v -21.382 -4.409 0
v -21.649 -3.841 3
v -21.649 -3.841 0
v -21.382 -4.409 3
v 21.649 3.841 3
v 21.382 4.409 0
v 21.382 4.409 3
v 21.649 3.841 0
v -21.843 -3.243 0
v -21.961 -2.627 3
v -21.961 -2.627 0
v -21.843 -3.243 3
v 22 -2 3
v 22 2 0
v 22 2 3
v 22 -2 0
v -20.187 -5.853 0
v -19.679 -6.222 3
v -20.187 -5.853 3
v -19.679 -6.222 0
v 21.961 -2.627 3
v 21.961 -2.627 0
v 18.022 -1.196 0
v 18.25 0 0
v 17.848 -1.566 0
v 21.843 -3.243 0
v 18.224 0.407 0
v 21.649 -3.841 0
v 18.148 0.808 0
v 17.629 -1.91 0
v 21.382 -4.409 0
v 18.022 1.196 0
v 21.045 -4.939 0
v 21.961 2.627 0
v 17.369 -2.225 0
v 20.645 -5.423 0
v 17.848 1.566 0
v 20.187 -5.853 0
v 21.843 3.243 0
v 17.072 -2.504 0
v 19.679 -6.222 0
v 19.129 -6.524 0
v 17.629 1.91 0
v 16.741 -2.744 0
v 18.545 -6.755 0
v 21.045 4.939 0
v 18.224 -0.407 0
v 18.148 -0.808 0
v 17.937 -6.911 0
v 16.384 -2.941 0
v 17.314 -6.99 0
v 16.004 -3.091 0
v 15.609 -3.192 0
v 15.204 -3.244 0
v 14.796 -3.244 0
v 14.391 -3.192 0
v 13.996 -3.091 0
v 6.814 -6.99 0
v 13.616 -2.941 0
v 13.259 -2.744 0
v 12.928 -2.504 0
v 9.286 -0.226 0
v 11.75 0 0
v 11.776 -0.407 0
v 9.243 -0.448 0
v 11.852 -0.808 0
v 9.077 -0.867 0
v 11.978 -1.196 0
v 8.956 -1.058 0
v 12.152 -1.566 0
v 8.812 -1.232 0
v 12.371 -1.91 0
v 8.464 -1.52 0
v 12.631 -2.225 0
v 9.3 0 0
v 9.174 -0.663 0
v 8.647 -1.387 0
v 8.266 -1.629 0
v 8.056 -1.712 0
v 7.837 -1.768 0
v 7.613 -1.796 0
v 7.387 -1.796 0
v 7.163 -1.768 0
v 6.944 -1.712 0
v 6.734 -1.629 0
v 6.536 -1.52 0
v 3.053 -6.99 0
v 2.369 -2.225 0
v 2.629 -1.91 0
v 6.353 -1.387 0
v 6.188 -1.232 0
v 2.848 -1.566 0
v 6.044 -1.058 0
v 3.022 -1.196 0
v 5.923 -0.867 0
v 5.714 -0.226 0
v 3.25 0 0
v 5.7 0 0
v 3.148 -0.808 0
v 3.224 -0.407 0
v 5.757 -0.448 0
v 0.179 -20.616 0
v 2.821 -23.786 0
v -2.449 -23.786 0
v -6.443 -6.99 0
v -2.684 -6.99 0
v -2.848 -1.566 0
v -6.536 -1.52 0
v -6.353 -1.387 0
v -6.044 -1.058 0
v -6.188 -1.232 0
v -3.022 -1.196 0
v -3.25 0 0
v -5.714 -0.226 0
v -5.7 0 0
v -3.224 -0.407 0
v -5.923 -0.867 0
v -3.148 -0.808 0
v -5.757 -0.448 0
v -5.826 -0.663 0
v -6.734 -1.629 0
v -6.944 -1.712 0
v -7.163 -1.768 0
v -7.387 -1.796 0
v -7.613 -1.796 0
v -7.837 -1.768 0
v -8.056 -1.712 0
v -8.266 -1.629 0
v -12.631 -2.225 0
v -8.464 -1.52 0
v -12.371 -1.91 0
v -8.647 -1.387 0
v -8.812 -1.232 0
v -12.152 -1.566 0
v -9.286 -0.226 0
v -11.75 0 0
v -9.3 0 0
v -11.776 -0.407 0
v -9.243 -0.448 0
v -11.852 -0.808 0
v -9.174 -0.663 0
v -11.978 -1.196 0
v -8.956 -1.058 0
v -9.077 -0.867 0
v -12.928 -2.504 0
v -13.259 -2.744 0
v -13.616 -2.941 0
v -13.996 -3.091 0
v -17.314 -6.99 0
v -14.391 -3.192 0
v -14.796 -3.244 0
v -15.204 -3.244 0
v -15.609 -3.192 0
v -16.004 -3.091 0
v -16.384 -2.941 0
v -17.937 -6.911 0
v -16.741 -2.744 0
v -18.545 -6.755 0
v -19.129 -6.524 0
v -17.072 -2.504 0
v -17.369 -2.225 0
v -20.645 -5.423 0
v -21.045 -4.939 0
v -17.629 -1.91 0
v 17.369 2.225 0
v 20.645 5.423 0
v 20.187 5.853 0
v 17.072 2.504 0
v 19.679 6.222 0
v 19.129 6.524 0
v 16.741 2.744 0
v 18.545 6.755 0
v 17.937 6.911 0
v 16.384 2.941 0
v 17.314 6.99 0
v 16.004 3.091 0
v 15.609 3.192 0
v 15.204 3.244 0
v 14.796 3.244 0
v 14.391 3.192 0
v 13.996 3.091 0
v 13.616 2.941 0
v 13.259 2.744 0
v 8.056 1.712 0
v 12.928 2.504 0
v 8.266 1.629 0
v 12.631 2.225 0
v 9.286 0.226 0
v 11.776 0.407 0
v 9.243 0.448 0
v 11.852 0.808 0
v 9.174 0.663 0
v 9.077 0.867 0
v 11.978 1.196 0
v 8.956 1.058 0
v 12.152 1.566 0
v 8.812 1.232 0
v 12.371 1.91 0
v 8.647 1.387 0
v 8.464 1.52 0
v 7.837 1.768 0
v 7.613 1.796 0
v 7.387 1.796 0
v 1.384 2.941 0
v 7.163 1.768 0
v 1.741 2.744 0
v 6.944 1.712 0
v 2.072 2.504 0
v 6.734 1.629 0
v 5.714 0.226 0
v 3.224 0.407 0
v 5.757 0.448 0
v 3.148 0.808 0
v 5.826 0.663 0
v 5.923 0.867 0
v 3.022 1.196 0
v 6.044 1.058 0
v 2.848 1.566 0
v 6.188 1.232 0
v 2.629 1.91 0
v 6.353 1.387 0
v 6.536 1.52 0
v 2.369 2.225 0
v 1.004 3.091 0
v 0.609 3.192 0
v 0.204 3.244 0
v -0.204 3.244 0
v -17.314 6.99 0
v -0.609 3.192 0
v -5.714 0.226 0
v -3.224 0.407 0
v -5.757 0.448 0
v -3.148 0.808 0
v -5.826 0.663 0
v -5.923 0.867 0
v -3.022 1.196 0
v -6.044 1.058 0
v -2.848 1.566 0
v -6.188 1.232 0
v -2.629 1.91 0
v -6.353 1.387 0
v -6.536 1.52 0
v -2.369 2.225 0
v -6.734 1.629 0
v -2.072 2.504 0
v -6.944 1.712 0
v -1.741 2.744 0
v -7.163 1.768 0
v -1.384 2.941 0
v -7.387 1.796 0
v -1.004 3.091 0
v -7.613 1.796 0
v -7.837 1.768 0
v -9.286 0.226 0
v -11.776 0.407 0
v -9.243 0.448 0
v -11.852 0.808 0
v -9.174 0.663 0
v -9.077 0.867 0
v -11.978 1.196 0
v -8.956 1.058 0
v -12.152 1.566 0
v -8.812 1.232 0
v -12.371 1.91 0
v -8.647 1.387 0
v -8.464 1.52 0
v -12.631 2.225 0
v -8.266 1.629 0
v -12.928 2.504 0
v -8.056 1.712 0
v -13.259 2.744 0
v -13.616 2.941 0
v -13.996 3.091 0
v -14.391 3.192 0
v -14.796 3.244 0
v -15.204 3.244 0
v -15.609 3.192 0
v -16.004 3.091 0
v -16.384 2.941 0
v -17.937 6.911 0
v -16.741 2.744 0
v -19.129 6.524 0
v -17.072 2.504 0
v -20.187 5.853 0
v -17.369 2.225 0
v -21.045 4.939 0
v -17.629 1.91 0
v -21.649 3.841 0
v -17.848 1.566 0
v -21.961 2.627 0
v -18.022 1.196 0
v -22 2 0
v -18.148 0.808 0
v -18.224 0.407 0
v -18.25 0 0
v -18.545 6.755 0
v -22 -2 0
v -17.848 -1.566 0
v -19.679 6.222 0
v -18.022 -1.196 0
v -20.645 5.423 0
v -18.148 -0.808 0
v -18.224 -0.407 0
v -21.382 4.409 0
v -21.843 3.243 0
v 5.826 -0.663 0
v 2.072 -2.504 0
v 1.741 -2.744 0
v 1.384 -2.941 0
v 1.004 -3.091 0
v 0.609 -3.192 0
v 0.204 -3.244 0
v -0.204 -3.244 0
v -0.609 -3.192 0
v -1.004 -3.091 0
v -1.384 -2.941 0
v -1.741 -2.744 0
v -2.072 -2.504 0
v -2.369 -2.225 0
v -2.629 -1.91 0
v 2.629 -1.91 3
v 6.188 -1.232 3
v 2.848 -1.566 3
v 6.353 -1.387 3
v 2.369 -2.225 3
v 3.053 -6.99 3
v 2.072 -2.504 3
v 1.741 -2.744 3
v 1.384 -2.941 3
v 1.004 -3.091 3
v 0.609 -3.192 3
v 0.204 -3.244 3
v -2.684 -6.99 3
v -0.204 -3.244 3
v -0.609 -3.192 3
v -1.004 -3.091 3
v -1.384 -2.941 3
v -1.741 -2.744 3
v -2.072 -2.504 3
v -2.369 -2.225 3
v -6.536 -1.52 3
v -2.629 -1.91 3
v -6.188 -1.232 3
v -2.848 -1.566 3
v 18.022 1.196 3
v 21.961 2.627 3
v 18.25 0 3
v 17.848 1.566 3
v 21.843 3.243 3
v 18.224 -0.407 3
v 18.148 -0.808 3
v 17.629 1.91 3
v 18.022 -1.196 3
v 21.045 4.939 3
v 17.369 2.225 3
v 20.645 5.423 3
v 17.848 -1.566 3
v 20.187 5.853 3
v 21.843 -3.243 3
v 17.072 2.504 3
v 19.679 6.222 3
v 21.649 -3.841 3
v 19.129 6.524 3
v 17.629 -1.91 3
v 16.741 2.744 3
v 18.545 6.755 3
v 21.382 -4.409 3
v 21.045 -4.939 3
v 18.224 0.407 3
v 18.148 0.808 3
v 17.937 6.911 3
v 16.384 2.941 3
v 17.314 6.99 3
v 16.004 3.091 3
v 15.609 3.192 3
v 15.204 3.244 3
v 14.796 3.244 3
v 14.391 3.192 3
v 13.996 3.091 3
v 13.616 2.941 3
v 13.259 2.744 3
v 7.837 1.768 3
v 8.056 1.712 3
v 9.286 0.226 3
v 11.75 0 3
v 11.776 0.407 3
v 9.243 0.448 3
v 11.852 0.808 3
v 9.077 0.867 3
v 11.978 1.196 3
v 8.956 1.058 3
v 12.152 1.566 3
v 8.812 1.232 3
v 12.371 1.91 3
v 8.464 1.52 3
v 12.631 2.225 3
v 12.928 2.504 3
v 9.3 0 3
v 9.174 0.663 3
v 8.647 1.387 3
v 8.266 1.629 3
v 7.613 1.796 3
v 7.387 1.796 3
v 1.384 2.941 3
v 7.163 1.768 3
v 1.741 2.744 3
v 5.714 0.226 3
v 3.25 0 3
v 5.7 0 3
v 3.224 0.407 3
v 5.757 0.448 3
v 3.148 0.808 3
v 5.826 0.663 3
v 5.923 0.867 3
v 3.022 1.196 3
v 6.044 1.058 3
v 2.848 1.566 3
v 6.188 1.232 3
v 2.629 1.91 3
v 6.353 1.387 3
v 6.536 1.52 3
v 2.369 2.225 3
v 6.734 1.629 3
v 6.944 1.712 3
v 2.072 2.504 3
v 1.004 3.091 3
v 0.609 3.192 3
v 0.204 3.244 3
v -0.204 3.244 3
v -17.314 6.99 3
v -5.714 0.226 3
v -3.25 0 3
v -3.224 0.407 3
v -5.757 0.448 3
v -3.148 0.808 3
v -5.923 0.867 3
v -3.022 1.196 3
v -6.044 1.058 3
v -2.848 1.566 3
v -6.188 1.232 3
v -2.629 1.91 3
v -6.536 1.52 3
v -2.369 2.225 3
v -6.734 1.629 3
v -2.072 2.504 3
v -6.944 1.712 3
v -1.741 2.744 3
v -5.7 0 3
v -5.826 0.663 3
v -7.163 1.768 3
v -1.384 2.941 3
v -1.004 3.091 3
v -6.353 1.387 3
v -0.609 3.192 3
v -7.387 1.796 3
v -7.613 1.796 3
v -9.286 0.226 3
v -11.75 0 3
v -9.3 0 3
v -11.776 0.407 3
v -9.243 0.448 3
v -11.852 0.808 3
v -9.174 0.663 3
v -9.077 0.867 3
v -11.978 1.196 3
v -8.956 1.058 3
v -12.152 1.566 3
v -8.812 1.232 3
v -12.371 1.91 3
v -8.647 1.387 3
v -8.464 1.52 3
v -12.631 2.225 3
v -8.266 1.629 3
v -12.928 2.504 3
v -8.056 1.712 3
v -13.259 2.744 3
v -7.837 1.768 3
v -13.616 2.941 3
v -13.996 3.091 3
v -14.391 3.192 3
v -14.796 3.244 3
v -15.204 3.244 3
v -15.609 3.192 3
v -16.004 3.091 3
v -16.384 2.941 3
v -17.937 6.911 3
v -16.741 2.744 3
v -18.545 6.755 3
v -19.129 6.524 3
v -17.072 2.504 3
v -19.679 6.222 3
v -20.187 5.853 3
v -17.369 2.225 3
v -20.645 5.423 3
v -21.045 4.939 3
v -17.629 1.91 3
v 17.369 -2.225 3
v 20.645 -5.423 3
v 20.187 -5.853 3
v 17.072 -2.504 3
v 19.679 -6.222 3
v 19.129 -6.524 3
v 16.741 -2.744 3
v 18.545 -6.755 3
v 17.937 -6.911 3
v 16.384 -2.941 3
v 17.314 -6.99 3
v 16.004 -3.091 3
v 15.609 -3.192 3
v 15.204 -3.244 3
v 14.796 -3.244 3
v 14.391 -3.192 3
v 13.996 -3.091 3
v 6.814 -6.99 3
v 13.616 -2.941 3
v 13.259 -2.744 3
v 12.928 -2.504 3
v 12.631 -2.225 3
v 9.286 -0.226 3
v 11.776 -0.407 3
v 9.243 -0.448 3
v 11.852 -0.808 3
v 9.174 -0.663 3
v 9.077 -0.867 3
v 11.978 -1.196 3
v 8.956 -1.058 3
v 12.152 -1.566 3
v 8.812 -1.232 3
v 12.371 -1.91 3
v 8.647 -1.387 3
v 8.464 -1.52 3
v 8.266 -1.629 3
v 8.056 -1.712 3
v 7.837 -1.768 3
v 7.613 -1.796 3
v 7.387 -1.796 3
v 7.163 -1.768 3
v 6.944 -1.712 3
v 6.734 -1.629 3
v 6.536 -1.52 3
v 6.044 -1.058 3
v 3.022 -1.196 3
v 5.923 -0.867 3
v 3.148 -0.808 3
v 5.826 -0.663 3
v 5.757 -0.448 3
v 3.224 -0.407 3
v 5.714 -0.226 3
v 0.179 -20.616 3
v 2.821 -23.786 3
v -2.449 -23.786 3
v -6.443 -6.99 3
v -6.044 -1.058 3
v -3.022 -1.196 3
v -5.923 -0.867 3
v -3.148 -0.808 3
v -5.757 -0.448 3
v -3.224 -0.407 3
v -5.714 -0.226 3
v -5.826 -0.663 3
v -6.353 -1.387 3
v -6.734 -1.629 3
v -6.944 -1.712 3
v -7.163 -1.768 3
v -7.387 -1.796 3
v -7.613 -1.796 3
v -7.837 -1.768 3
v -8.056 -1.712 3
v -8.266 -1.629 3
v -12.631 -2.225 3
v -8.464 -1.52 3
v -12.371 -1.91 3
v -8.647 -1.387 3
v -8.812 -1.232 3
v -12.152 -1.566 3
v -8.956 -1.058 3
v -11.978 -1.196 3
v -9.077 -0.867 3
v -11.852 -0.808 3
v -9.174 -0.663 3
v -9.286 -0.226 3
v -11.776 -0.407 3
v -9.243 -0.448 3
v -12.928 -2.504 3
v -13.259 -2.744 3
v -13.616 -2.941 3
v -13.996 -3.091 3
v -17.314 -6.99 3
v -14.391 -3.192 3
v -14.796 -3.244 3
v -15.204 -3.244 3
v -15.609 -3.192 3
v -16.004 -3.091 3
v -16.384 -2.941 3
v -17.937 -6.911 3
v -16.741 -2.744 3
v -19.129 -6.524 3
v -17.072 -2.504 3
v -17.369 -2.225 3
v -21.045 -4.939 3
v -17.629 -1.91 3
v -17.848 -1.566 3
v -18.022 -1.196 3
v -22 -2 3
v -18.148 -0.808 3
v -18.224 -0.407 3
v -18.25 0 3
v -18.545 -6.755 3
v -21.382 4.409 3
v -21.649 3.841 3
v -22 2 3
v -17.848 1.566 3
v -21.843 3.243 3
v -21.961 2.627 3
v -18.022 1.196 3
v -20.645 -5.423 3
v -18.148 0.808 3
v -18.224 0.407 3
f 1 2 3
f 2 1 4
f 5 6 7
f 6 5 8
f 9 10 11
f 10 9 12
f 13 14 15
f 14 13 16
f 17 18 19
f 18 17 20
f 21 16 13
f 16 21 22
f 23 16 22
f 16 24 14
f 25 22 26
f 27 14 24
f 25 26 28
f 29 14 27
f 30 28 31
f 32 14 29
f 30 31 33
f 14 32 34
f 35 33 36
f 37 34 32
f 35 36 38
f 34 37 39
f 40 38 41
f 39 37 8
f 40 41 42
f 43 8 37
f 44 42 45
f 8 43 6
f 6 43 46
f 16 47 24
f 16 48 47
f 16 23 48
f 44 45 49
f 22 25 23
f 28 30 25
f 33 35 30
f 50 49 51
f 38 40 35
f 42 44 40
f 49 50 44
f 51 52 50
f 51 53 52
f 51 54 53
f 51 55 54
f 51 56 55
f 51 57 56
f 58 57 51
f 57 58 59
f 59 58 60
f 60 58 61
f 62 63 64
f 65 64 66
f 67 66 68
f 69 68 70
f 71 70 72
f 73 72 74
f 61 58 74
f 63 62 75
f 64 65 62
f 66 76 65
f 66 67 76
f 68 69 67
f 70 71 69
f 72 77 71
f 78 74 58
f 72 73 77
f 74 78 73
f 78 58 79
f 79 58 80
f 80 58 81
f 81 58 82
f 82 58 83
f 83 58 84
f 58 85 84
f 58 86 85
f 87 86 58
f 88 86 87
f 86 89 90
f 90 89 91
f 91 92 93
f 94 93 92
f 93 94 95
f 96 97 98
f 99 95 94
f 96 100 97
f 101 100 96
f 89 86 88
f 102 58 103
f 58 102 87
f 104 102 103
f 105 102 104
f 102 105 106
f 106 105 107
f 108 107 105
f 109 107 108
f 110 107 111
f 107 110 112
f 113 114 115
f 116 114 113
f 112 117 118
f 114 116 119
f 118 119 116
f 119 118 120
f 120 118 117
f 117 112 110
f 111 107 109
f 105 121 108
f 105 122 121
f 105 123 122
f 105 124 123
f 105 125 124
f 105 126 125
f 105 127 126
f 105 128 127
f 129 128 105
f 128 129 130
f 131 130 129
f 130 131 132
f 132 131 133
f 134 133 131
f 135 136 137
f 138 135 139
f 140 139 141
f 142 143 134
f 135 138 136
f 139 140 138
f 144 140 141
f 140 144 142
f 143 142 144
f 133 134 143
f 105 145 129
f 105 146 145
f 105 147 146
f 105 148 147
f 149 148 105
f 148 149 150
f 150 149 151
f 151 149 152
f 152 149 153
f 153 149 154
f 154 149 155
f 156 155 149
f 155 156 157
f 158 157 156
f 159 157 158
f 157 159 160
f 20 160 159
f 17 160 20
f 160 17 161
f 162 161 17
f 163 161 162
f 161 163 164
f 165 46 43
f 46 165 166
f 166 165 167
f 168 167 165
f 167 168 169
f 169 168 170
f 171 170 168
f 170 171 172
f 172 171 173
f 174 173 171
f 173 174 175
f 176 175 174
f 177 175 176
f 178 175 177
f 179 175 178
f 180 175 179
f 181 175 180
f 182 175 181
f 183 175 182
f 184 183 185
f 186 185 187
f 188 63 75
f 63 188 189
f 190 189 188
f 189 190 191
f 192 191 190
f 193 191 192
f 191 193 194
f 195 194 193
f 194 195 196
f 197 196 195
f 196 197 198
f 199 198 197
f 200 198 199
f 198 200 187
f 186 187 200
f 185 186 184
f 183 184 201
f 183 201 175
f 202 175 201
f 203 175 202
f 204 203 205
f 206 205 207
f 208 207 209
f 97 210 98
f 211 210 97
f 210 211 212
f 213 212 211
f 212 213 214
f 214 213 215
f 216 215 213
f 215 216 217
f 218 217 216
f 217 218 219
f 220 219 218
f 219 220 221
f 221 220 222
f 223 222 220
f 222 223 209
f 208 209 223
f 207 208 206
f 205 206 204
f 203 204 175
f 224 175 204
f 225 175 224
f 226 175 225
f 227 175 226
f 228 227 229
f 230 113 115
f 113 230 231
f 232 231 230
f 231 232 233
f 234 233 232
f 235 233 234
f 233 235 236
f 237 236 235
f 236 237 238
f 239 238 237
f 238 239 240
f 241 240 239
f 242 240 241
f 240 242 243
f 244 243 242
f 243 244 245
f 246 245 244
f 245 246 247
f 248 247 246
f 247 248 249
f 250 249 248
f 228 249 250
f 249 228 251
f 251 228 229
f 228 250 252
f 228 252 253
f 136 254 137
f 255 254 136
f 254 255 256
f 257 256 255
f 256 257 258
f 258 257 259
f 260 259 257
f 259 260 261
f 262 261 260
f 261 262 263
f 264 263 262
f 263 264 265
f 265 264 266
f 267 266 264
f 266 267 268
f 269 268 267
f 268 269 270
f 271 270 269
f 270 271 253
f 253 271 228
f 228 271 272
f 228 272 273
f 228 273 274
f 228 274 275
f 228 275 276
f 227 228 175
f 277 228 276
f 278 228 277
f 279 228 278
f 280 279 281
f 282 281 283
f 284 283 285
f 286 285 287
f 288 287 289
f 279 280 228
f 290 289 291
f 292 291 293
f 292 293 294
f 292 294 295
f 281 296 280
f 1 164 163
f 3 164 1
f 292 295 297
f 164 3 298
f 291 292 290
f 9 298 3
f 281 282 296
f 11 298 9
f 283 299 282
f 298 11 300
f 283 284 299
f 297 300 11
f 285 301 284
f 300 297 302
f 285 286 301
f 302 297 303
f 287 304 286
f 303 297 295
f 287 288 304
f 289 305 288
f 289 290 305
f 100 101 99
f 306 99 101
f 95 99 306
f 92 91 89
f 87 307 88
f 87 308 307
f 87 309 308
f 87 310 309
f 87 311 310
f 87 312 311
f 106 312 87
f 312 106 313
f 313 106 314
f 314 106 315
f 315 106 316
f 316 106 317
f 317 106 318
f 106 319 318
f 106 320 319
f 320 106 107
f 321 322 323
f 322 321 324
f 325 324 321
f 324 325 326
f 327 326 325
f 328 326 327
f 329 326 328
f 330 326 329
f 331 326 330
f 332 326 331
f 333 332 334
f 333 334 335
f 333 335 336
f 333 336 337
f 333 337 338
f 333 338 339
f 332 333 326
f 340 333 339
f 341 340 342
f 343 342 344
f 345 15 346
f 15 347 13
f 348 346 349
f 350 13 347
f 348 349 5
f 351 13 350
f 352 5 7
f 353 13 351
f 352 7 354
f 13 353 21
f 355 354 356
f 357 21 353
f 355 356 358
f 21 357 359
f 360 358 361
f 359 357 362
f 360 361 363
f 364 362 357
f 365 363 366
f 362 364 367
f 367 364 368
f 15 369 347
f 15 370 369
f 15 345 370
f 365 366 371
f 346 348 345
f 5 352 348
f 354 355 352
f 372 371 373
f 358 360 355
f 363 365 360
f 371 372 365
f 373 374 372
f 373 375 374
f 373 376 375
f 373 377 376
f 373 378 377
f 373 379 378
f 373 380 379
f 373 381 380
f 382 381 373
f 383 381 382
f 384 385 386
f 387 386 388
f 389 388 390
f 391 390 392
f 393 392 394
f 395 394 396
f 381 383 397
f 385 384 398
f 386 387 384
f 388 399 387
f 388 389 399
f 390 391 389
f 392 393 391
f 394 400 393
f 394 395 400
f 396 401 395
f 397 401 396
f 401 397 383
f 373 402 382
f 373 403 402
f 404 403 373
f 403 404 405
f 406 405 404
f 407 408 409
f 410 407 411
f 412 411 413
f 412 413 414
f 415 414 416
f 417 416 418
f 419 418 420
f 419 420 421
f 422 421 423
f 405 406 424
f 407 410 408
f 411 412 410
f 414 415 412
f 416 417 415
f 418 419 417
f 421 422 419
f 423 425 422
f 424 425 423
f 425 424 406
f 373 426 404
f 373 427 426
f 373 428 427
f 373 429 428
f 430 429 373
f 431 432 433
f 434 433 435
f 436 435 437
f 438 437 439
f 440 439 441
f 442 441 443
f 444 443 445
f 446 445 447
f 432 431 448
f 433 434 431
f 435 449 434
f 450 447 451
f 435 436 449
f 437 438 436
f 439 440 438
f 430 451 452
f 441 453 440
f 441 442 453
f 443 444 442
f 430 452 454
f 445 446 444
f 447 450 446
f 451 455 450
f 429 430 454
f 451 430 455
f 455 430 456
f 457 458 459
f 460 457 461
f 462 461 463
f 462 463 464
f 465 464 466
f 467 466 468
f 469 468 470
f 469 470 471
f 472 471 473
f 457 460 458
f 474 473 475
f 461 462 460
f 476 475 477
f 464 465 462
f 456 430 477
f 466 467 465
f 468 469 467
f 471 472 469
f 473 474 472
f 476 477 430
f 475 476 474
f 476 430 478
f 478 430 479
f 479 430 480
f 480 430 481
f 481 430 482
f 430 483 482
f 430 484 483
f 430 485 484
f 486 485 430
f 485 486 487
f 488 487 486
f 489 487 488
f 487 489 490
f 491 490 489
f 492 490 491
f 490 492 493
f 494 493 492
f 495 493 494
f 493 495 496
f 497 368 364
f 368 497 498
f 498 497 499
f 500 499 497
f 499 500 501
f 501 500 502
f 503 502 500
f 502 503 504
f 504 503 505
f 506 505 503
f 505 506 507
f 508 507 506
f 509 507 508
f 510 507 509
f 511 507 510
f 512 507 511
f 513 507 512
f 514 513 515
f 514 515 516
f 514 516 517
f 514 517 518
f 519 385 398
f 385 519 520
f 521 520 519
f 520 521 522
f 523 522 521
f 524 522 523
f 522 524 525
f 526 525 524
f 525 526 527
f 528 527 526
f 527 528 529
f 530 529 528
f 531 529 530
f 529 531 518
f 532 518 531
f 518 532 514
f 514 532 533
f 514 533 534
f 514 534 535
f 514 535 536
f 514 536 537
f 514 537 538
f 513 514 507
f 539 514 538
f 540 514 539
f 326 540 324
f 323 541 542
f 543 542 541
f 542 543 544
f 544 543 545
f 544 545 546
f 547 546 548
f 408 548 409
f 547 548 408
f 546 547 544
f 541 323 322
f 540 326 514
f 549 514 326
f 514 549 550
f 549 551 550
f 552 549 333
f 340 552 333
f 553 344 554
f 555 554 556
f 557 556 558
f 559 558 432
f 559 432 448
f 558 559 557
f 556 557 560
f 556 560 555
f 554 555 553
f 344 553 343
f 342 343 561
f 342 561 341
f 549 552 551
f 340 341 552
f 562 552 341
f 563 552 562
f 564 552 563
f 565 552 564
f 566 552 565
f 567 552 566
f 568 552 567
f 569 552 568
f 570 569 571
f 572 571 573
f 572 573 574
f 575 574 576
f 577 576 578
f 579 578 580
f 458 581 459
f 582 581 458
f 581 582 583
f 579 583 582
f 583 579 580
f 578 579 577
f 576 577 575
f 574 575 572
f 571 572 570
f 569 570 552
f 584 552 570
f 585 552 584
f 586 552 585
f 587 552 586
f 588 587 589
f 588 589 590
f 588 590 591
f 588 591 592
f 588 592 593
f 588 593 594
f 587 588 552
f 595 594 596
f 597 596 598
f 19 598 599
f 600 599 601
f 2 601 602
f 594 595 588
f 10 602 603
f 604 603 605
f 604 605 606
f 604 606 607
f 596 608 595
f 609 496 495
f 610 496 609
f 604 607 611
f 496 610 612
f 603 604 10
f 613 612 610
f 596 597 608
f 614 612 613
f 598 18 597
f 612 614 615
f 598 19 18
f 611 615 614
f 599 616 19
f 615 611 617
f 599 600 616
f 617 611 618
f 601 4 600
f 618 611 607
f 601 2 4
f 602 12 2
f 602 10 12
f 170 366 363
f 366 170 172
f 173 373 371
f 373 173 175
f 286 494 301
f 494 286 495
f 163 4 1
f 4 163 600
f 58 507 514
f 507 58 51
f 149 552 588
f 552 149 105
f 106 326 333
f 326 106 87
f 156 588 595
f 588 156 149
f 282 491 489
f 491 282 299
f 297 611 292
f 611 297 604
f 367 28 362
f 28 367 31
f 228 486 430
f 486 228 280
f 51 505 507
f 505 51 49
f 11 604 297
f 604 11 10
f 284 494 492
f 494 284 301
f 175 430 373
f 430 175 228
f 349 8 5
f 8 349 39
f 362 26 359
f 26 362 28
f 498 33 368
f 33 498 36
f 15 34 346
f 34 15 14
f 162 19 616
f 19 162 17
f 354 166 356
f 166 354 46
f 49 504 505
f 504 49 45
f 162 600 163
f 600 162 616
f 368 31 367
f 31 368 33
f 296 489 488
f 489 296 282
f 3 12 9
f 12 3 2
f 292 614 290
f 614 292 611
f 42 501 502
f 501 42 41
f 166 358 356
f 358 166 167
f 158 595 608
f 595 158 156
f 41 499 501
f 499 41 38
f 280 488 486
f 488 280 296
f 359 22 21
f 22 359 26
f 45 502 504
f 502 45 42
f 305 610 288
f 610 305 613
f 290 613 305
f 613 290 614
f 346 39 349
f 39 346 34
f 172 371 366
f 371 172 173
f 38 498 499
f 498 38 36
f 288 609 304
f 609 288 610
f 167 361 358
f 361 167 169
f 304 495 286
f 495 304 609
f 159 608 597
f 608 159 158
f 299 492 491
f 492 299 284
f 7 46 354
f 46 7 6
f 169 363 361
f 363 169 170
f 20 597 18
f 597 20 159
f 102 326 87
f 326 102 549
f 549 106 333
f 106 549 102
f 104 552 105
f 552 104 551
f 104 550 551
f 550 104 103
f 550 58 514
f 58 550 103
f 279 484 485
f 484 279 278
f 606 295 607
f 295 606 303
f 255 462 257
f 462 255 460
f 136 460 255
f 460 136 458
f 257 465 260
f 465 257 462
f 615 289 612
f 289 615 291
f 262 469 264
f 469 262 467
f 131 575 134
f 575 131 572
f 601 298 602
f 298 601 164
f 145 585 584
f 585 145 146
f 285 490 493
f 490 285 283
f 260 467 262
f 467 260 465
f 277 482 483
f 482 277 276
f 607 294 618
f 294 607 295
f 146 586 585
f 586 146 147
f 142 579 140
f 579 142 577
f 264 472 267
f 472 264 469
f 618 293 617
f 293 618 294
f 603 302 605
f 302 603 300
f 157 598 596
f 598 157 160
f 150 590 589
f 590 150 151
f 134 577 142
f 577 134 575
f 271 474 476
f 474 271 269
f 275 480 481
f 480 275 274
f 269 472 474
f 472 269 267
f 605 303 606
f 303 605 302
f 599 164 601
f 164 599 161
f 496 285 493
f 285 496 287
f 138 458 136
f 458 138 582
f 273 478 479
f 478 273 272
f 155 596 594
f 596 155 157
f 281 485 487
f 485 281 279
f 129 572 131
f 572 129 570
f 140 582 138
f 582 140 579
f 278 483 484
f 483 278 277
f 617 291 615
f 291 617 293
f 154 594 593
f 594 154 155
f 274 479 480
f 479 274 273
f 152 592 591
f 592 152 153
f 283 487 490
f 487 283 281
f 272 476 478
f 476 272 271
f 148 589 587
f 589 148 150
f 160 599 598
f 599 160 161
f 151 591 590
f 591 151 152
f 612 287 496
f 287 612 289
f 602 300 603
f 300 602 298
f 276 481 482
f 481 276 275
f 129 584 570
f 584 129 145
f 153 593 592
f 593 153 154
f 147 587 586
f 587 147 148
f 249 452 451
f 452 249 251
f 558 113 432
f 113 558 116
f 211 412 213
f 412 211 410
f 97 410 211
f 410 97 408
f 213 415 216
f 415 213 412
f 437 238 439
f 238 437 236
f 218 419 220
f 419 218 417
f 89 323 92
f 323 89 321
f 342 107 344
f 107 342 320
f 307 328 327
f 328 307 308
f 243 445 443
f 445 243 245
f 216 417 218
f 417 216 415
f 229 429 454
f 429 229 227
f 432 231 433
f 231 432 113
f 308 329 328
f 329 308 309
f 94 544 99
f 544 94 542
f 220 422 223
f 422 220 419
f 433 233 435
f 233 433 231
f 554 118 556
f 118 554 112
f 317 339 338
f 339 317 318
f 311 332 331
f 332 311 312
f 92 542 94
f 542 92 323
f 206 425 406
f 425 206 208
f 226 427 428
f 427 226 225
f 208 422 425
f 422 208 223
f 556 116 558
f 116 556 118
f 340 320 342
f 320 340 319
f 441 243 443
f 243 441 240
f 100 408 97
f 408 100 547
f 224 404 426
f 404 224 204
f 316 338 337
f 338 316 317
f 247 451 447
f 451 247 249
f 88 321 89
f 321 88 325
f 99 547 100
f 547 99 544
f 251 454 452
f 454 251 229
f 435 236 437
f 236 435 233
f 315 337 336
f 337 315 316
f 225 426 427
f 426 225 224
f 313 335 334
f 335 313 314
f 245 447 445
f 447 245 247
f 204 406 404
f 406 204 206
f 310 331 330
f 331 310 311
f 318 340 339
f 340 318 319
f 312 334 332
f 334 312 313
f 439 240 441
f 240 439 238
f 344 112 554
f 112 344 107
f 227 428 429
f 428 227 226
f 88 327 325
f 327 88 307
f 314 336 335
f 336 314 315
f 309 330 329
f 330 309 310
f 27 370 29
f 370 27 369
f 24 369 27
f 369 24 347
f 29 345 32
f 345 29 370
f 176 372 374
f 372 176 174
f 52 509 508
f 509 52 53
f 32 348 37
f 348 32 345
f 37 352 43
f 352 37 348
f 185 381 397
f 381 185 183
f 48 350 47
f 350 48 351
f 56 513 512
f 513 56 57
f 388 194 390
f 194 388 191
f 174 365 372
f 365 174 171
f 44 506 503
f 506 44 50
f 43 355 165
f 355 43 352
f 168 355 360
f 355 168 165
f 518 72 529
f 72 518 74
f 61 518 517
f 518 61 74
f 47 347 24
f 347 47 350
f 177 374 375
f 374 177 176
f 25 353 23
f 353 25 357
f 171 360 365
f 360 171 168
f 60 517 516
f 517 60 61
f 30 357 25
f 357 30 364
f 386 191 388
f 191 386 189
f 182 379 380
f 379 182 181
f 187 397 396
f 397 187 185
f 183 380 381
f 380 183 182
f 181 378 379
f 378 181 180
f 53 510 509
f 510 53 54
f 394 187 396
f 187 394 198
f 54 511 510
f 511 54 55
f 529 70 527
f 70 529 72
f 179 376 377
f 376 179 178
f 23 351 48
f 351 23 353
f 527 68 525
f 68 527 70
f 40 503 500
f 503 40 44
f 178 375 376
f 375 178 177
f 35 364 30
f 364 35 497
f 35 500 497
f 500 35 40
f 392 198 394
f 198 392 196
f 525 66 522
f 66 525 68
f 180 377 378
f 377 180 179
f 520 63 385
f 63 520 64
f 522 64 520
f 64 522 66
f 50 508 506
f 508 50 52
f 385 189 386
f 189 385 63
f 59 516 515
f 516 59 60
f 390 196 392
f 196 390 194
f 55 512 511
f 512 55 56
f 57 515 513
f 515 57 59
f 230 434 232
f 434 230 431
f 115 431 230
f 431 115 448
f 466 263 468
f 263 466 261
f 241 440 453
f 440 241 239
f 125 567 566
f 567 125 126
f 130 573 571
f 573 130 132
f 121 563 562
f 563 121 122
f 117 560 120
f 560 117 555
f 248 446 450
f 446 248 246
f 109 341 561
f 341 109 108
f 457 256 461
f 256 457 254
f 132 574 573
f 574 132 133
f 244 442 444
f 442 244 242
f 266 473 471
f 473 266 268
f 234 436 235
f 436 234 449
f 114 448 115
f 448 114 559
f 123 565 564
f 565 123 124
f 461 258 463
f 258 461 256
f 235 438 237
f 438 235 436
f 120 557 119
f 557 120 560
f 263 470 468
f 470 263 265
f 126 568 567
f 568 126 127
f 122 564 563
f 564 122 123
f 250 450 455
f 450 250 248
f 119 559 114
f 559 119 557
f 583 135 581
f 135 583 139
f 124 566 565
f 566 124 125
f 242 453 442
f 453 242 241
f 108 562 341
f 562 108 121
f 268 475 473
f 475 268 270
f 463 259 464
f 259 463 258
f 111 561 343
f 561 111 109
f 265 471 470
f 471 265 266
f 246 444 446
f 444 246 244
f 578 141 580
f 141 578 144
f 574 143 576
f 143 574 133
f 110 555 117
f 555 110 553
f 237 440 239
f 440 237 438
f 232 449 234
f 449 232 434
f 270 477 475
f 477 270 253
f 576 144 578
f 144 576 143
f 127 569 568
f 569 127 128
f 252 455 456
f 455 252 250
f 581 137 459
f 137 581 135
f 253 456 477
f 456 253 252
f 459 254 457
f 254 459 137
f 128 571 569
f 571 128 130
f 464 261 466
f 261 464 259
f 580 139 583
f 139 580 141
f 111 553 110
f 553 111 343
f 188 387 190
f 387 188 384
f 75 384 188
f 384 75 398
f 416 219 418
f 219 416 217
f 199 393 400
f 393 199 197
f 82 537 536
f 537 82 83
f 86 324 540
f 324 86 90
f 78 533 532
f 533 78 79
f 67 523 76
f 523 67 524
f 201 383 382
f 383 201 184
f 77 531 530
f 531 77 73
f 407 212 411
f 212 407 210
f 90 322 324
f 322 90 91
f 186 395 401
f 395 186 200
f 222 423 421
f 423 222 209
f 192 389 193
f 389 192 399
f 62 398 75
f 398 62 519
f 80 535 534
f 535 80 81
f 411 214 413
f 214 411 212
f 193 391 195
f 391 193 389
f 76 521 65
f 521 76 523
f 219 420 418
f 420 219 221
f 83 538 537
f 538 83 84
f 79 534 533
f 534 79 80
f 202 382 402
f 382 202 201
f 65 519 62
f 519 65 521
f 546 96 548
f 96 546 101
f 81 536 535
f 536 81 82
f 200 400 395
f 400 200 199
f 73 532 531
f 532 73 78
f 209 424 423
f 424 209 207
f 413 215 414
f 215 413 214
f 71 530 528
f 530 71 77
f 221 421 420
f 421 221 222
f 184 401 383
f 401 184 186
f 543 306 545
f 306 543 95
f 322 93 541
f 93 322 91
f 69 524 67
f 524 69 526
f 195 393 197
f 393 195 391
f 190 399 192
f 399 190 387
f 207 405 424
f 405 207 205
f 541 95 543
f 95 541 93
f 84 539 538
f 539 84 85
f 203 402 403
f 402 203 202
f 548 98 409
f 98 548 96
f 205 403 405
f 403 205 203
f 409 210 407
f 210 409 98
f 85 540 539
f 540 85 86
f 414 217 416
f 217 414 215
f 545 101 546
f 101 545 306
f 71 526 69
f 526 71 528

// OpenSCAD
$fn = 50;


difference() {
	union() {
		hull() {
			translate(v = [-17.0000000000, 2.0000000000, 0]) {
				cylinder(h = 3, r = 5);
			}
			translate(v = [17.0000000000, 2.0000000000, 0]) {
				cylinder(h = 3, r = 5);
			}
			translate(v = [-17.0000000000, -2.0000000000, 0]) {
				cylinder(h = 3, r = 5);
			}
			translate(v = [17.0000000000, -2.0000000000, 0]) {
				cylinder(h = 3, r = 5);
			}
		}
		translate(v = [0, -5, 0]) {
			linear_extrude(height = 3) {
				text(font = "DejaVu Sans Mono:style=Bold", halign = "center", size = 19.0000000000, text = "V", valign = "top");
			}
		}
	}
	union() {
		translate(v = [-15.0000000000, 0.0000000000, 0]) {
			translate(v = [0, 0, -100]) {
				cylinder(h = 200, r = 3.2500000000);
			}
		}
		translate(v = [0, 0, -100]) {
			cylinder(h = 200, r = 3.2500000000);
		}
		translate(v = [15.0000000000, 0.0000000000, 0]) {
			translate(v = [0, 0, -100]) {
				cylinder(h = 200, r = 3.2500000000);
			}
		}
		translate(v = [-15.0000000000, 0.0000000000, 0]) {
			translate(v = [0, 0, -100]) {
				cylinder(h = 200, r = 1.8000000000);
			}
		}
		translate(v = [-7.5000000000, 0.0000000000, 0]) {
			translate(v = [0, 0, -100]) {
				cylinder(h = 200, r = 1.8000000000);
			}
		}
		translate(v = [0, 0, -100]) {
			cylinder(h = 200, r = 1.8000000000);
		}
		translate(v = [7.5000000000, 0.0000000000, 0]) {
			translate(v = [0, 0, -100]) {
				cylinder(h = 200, r = 1.8000000000);
			}
		}
		translate(v = [15.0000000000, 0.0000000000, 0]) {
			translate(v = [0, 0, -100]) {
				cylinder(h = 200, r = 1.8000000000);
			}
		}
	}
}
